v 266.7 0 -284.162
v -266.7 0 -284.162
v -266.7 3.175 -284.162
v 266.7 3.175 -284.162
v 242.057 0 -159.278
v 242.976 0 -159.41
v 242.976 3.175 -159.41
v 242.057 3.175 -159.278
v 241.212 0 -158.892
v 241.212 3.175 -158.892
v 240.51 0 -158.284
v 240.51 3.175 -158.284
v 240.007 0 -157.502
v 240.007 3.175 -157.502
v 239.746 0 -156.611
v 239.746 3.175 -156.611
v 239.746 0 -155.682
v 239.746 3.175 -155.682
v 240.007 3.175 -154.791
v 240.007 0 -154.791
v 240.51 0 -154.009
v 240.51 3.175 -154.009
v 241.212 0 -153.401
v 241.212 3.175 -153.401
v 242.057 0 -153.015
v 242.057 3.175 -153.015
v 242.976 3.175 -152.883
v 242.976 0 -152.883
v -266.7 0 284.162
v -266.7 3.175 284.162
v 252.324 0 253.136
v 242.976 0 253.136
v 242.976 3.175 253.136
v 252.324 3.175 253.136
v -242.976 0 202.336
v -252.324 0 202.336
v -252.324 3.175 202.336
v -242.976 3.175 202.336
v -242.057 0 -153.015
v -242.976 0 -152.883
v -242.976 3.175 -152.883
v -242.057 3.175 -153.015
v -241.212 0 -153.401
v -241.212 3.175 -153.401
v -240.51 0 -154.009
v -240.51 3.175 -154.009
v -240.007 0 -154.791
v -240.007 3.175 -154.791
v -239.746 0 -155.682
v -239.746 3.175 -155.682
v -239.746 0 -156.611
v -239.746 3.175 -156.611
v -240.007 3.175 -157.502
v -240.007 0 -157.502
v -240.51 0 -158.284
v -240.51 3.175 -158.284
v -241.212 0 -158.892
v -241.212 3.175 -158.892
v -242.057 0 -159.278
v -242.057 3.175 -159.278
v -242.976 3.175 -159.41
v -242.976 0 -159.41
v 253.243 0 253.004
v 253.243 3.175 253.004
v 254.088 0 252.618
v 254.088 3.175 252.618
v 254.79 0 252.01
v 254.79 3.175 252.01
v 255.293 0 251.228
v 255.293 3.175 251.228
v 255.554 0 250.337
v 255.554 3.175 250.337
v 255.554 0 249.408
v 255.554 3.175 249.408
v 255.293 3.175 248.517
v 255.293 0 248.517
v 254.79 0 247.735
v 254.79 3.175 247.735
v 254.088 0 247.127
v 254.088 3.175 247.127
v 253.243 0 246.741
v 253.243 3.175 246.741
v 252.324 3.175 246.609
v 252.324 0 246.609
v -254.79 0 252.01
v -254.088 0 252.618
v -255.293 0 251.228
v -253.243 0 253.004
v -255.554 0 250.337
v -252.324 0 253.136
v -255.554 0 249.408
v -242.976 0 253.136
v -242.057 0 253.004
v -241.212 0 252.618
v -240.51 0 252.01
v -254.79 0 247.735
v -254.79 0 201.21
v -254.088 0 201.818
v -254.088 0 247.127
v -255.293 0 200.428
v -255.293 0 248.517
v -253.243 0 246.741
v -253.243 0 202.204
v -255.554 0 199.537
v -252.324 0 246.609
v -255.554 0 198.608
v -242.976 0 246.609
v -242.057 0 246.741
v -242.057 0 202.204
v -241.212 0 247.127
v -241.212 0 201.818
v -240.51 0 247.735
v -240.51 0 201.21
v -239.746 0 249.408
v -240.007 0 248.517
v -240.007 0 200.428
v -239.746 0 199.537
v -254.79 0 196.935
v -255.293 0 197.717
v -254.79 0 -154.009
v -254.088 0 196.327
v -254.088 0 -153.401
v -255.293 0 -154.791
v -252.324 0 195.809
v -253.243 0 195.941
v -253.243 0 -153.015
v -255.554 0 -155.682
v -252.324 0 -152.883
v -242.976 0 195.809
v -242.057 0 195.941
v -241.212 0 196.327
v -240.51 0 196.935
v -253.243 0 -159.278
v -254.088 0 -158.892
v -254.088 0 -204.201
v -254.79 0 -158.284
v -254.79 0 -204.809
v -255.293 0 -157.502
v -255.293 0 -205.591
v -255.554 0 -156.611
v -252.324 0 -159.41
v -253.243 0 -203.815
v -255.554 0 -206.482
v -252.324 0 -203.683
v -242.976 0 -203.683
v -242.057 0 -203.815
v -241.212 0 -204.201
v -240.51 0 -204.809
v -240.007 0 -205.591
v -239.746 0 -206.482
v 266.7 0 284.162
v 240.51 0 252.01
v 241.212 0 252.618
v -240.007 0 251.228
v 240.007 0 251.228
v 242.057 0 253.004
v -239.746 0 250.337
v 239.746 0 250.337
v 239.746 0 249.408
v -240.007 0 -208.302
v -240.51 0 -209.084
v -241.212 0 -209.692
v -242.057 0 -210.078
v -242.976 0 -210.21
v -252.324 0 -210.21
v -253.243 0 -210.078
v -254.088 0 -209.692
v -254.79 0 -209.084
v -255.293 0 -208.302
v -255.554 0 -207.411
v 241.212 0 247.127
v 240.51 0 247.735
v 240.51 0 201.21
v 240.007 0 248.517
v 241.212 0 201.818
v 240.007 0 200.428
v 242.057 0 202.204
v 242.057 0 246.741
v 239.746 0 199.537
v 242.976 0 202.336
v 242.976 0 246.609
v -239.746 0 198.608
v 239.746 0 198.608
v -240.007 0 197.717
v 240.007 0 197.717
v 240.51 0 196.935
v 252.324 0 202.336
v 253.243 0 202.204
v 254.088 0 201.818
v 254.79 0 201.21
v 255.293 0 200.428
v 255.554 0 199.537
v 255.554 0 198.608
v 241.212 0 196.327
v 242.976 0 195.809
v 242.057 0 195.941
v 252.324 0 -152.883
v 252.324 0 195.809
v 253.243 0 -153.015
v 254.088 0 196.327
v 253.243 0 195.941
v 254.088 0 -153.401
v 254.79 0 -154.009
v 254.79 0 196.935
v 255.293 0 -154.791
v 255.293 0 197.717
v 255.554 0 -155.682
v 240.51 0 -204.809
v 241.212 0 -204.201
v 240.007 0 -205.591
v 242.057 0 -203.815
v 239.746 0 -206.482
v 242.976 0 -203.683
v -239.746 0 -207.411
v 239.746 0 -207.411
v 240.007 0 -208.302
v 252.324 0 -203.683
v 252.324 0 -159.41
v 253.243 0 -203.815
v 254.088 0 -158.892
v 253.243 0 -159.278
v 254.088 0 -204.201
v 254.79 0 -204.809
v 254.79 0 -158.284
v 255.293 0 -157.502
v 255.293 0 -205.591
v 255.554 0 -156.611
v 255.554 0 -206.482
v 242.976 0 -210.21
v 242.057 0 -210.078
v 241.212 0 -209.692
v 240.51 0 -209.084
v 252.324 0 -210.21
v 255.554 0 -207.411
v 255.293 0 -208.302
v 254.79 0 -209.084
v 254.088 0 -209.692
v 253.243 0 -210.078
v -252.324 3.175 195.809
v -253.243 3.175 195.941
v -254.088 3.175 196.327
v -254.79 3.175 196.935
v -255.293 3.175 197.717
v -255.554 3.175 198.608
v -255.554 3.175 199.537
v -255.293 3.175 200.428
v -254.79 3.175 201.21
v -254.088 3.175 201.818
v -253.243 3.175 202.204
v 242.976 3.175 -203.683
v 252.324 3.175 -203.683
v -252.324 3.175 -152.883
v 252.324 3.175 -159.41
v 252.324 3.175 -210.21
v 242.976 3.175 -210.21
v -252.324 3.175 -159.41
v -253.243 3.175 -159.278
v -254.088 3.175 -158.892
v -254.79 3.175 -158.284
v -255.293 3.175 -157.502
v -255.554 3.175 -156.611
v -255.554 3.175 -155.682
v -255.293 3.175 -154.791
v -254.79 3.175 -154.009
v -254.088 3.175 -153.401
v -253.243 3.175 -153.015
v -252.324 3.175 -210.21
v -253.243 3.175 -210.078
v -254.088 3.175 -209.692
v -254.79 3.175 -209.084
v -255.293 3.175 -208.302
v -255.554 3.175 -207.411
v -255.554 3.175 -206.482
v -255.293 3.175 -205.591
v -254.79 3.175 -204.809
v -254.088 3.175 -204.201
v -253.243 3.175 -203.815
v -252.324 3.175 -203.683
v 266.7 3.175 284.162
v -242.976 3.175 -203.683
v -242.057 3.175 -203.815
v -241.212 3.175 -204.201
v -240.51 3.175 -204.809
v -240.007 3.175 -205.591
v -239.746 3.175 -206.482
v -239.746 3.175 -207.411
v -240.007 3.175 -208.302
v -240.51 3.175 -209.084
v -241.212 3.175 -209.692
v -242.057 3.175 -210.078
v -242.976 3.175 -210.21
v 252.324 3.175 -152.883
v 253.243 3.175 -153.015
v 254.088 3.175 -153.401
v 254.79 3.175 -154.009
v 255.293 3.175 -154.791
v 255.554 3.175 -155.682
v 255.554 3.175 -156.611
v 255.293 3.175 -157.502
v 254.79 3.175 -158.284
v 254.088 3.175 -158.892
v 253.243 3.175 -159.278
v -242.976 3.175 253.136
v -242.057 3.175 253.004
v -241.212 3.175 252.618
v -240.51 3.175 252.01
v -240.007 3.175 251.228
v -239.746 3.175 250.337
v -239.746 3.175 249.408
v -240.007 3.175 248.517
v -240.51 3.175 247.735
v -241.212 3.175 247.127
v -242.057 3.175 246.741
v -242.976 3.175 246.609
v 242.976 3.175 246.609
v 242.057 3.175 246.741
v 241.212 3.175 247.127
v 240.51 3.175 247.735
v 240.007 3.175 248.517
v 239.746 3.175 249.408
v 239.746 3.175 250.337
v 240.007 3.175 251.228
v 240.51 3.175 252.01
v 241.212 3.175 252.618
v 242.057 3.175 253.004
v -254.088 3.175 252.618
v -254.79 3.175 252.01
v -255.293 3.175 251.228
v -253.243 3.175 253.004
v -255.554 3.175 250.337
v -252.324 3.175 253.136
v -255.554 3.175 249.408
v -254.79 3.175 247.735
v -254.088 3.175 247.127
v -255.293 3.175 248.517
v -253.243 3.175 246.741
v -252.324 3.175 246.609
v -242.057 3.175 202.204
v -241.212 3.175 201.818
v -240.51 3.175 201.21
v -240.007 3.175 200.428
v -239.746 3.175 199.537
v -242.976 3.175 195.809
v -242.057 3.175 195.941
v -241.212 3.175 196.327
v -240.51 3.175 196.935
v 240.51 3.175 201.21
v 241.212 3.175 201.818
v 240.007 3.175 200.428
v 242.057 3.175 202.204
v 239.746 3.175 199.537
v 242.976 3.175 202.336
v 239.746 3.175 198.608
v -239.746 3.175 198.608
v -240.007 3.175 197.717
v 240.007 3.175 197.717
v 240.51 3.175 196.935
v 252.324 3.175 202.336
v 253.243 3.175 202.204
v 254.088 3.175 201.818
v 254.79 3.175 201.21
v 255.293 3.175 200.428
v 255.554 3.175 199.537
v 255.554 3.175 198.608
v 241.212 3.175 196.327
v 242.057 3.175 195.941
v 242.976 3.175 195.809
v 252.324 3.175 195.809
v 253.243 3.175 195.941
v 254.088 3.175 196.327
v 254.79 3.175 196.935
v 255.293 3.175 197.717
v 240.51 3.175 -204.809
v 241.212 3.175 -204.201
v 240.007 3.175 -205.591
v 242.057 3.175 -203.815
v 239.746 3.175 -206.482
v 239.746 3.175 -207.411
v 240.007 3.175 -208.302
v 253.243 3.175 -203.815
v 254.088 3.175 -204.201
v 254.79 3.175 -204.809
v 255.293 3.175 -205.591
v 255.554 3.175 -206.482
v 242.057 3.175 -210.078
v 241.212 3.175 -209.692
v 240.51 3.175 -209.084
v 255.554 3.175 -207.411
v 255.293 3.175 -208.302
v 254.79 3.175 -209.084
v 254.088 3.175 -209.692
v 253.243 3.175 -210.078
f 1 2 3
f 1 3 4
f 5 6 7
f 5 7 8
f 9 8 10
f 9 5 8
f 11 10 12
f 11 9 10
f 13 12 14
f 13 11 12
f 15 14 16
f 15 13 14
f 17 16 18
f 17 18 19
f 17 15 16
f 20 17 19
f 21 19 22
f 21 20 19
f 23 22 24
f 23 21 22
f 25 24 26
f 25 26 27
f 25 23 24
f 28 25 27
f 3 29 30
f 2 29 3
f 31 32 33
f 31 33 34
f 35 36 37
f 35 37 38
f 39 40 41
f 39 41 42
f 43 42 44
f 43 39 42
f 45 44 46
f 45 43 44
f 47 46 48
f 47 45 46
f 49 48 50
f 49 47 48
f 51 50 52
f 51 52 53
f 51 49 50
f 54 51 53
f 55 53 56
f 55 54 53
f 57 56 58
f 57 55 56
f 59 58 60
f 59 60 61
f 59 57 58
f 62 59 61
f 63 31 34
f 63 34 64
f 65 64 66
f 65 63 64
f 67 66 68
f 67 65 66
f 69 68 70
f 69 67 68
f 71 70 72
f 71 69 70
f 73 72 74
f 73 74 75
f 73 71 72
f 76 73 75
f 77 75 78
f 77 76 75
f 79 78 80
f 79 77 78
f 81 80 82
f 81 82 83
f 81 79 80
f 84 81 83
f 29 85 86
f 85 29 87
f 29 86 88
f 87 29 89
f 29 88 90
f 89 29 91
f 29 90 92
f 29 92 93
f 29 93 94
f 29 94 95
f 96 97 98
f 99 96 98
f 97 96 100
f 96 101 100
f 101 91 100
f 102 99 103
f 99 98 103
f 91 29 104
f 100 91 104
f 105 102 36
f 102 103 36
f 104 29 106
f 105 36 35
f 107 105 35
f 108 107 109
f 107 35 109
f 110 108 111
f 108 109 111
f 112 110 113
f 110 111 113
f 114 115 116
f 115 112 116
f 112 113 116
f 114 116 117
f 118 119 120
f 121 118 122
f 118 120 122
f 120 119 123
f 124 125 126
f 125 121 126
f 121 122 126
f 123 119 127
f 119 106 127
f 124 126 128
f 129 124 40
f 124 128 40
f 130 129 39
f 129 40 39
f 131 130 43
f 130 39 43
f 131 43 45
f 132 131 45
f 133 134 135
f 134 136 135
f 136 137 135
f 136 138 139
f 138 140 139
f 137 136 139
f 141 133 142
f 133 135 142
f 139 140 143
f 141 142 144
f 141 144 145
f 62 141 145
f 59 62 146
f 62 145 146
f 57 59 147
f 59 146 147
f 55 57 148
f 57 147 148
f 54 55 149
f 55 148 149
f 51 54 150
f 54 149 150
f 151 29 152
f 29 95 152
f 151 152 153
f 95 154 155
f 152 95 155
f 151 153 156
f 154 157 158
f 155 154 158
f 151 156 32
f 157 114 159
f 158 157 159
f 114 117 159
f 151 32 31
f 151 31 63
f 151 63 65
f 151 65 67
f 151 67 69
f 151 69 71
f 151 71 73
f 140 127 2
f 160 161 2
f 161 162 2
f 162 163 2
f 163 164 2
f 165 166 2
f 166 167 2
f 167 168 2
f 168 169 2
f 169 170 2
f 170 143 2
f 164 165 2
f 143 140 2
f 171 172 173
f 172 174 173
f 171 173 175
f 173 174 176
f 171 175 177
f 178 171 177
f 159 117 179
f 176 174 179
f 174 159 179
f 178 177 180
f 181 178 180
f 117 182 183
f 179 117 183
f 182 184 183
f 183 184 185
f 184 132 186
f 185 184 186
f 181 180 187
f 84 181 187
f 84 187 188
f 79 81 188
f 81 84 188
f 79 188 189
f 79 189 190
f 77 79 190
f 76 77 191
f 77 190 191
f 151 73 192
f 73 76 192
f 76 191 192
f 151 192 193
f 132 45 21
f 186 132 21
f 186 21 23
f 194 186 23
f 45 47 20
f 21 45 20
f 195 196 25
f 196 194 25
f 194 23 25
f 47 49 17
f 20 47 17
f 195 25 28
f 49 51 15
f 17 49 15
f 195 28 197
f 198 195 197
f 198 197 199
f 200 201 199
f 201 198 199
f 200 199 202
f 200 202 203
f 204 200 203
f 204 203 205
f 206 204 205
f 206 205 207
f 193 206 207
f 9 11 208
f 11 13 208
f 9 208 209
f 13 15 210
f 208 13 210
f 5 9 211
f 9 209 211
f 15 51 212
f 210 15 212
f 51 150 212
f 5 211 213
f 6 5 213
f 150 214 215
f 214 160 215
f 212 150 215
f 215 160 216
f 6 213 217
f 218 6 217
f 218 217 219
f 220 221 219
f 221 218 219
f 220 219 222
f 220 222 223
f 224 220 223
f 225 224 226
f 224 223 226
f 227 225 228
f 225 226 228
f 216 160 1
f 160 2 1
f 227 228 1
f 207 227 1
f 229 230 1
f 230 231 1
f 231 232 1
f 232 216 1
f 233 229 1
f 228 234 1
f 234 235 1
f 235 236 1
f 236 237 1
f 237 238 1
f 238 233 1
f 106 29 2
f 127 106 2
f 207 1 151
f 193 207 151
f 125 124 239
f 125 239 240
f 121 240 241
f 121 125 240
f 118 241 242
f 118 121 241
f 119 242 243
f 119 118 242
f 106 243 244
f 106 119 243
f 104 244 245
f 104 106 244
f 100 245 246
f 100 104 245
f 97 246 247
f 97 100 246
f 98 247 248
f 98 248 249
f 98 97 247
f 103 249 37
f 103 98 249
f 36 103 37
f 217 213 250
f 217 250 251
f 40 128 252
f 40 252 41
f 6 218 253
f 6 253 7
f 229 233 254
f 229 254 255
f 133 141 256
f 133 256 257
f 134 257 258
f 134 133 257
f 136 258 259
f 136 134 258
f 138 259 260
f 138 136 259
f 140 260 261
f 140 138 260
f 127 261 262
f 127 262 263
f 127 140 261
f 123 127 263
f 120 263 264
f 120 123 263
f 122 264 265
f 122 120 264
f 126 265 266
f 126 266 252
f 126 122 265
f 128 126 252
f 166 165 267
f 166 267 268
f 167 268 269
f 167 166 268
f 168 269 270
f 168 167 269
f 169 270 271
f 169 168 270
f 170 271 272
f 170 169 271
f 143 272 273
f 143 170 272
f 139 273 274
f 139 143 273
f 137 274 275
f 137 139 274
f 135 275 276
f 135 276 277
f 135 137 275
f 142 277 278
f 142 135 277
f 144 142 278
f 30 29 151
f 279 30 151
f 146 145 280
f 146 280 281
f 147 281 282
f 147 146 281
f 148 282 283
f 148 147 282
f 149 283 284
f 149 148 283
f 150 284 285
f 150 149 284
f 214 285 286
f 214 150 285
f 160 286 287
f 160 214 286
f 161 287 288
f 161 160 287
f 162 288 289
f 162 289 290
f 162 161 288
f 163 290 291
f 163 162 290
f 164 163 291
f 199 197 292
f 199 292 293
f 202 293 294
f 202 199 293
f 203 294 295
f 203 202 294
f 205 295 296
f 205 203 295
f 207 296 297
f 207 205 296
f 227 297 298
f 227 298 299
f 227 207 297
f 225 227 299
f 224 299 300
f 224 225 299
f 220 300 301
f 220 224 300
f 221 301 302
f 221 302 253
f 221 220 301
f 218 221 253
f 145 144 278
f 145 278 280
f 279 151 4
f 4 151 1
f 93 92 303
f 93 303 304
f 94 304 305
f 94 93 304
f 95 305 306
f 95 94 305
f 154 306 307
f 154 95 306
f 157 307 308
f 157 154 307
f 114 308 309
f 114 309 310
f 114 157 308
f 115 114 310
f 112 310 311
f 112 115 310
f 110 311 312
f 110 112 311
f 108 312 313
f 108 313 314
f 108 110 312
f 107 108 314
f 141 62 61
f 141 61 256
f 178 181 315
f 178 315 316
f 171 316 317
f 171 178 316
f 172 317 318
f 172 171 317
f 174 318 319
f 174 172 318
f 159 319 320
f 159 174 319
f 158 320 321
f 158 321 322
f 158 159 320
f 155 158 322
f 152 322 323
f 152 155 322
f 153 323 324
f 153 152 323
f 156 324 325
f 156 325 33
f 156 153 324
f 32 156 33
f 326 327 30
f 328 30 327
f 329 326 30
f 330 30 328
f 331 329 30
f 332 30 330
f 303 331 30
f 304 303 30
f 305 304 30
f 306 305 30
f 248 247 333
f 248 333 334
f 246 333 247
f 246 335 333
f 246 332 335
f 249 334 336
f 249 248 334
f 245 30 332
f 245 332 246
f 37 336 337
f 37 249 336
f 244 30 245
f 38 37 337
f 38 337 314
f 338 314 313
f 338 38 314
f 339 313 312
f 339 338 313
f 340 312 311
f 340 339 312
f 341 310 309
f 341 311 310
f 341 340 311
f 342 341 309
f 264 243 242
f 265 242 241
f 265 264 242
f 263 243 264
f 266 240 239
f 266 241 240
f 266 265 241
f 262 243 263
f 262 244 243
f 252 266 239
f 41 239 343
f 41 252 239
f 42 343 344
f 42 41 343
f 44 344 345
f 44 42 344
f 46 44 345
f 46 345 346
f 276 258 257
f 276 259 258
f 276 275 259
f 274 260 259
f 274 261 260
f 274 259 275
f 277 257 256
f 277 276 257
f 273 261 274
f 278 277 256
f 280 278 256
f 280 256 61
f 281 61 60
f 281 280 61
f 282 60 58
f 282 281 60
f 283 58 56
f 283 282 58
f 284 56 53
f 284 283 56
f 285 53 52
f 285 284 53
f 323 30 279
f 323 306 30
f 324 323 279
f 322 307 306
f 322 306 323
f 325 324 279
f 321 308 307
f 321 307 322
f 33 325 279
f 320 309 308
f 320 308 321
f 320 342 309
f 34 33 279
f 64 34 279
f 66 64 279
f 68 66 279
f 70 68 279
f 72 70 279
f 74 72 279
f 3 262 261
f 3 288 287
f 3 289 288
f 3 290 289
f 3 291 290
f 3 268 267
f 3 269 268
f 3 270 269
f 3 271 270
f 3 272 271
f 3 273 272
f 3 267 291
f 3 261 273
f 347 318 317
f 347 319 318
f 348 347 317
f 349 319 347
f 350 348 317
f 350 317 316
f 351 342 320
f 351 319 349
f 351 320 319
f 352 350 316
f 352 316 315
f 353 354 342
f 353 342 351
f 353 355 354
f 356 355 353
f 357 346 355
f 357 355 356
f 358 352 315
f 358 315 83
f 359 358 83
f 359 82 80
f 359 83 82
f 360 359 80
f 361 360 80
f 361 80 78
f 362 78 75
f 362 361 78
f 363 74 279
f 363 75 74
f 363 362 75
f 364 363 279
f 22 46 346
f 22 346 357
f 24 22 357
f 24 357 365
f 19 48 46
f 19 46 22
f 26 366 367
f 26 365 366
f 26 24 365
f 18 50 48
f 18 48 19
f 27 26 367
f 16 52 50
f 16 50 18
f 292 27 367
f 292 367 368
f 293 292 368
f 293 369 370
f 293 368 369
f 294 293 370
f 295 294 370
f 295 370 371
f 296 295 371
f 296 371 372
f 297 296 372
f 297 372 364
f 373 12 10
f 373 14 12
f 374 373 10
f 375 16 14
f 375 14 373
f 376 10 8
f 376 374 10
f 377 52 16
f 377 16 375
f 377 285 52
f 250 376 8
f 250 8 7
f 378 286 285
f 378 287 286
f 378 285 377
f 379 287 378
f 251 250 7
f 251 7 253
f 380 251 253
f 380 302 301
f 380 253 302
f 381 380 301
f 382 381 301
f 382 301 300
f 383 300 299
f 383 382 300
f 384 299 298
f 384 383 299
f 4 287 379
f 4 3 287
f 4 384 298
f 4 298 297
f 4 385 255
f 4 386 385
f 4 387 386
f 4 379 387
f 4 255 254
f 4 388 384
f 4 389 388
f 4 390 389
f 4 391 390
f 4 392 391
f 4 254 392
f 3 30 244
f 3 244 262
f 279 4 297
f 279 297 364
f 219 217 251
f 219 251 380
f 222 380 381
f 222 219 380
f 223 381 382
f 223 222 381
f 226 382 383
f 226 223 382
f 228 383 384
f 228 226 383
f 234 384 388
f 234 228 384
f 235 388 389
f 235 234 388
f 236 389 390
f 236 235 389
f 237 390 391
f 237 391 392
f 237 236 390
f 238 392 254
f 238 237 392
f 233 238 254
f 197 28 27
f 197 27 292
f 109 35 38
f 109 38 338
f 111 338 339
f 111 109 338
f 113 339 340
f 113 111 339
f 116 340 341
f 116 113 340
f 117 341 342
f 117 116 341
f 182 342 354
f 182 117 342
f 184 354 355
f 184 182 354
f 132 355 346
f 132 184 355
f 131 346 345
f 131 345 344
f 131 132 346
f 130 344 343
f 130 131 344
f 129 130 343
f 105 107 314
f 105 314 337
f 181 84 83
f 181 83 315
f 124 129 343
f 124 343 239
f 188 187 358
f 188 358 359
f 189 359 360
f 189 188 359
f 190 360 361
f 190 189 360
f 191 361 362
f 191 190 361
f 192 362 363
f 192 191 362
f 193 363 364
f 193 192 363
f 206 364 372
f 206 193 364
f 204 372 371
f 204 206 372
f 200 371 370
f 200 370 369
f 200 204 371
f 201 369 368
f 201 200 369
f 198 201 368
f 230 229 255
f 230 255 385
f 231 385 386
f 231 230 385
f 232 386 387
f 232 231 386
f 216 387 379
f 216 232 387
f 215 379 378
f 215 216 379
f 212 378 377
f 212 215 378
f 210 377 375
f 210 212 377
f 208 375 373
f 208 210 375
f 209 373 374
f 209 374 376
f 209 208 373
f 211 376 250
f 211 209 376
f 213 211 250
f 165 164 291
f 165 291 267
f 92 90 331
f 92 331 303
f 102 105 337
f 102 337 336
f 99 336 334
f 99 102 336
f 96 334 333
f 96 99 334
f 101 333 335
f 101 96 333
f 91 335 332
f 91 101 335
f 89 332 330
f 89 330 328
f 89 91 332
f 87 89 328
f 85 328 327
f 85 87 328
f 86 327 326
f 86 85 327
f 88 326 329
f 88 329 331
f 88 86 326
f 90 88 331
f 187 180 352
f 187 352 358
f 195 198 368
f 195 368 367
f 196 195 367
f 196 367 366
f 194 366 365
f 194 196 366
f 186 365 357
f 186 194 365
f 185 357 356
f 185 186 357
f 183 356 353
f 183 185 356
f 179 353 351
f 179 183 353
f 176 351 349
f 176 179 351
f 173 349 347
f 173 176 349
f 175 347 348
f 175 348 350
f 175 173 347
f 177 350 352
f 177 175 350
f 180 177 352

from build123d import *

# Parameters (mm, degrees)
SKETCH1_W                    = 533.4
SKETCH1_H                    = 568.325
BOSS_EXTRUDE1_DEPTH          = 3.175
F_0_257_DIAMETER_SLOT1_DEPTH = 3.175


# Read off the part's stored shape, not the designer's step: F (0.257) Diameter Slot1
with BuildPart() as part:
    # Sketch1 → Boss-Extrude1 (new body)
    with BuildSketch(Plane(origin=(0, 0, 0), x_dir=(1, 0, 0), z_dir=(0, 1, 0))):
        Rectangle(SKETCH1_W, SKETCH1_H)
    extrude(amount=BOSS_EXTRUDE1_DEPTH)

    # F (0.257) Diameter Slot1 outline → F (0.257) Diameter Slot1 (cut)
    with BuildSketch(Plane(origin=(0, 0, 0), x_dir=(1, 0, 0), z_dir=(0, 1, 0))):
        with BuildLine():
            Line((242.9764, 203.6826), (252.3236, 203.6826))
            ThreePointArc((252.3236, 203.6826), (255.5875, 206.9465), (252.3236, 210.2104))
            Line((252.3236, 210.2104), (242.9764, 210.2104))
            ThreePointArc((242.9764, 210.2104), (239.7125, 206.9465), (242.9764, 203.6826))
        make_face()
        with BuildLine():
            ThreePointArc((-242.9764, 203.6826), (-239.7125, 206.9465), (-242.9764, 210.2104))
            Line((-242.9764, 210.2104), (-252.3236, 210.2104))
            ThreePointArc((-252.3236, 210.2104), (-255.5875, 206.9465), (-252.3236, 203.6826))
            Line((-252.3236, 203.6826), (-242.9764, 203.6826))
        make_face()
        with BuildLine():
            Line((242.9764, 152.8826), (252.3236, 152.8826))
            ThreePointArc((252.3236, 152.8826), (255.5875, 156.1465), (252.3236, 159.4104))
            Line((252.3236, 159.4104), (242.9764, 159.4104))
            ThreePointArc((242.9764, 159.4104), (239.7125, 156.1465), (242.9764, 152.8826))
        make_face()
        with BuildLine():
            ThreePointArc((-242.9764, 152.8826), (-239.7125, 156.1465), (-242.9764, 159.4104))
            Line((-242.9764, 159.4104), (-252.3236, 159.4104))
            ThreePointArc((-252.3236, 159.4104), (-255.5875, 156.1465), (-252.3236, 152.8826))
            Line((-252.3236, 152.8826), (-242.9764, 152.8826))
        make_face()
        with BuildLine():
            Line((242.9764, -202.3364), (252.3236, -202.3364))
            ThreePointArc((252.3236, -202.3364), (255.5875, -199.0725), (252.3236, -195.8086))
            Line((252.3236, -195.8086), (242.9764, -195.8086))
            ThreePointArc((242.9764, -195.8086), (239.7125, -199.0725), (242.9764, -202.3364))
        make_face()
        with BuildLine():
            ThreePointArc((-242.9764, -202.3364), (-239.7125, -199.0725), (-242.9764, -195.8086))
            Line((-242.9764, -195.8086), (-252.3236, -195.8086))
            ThreePointArc((-252.3236, -195.8086), (-255.5875, -199.0725), (-252.3236, -202.3364))
            Line((-252.3236, -202.3364), (-242.9764, -202.3364))
        make_face()
        with BuildLine():
            Line((242.9764, -253.1364), (252.3236, -253.1364))
            ThreePointArc((252.3236, -253.1364), (255.5875, -249.8725), (252.3236, -246.6086))
            Line((252.3236, -246.6086), (242.9764, -246.6086))
            ThreePointArc((242.9764, -246.6086), (239.7125, -249.8725), (242.9764, -253.1364))
        make_face()
        with BuildLine():
            ThreePointArc((-242.9764, -253.1364), (-239.7125, -249.8725), (-242.9764, -246.6086))
            Line((-242.9764, -246.6086), (-252.3236, -246.6086))
            ThreePointArc((-252.3236, -246.6086), (-255.5875, -249.8725), (-252.3236, -253.1364))
            Line((-252.3236, -253.1364), (-242.9764, -253.1364))
        make_face()
    extrude(amount=F_0_257_DIAMETER_SLOT1_DEPTH, mode=Mode.SUBTRACT)


solid = part.part
